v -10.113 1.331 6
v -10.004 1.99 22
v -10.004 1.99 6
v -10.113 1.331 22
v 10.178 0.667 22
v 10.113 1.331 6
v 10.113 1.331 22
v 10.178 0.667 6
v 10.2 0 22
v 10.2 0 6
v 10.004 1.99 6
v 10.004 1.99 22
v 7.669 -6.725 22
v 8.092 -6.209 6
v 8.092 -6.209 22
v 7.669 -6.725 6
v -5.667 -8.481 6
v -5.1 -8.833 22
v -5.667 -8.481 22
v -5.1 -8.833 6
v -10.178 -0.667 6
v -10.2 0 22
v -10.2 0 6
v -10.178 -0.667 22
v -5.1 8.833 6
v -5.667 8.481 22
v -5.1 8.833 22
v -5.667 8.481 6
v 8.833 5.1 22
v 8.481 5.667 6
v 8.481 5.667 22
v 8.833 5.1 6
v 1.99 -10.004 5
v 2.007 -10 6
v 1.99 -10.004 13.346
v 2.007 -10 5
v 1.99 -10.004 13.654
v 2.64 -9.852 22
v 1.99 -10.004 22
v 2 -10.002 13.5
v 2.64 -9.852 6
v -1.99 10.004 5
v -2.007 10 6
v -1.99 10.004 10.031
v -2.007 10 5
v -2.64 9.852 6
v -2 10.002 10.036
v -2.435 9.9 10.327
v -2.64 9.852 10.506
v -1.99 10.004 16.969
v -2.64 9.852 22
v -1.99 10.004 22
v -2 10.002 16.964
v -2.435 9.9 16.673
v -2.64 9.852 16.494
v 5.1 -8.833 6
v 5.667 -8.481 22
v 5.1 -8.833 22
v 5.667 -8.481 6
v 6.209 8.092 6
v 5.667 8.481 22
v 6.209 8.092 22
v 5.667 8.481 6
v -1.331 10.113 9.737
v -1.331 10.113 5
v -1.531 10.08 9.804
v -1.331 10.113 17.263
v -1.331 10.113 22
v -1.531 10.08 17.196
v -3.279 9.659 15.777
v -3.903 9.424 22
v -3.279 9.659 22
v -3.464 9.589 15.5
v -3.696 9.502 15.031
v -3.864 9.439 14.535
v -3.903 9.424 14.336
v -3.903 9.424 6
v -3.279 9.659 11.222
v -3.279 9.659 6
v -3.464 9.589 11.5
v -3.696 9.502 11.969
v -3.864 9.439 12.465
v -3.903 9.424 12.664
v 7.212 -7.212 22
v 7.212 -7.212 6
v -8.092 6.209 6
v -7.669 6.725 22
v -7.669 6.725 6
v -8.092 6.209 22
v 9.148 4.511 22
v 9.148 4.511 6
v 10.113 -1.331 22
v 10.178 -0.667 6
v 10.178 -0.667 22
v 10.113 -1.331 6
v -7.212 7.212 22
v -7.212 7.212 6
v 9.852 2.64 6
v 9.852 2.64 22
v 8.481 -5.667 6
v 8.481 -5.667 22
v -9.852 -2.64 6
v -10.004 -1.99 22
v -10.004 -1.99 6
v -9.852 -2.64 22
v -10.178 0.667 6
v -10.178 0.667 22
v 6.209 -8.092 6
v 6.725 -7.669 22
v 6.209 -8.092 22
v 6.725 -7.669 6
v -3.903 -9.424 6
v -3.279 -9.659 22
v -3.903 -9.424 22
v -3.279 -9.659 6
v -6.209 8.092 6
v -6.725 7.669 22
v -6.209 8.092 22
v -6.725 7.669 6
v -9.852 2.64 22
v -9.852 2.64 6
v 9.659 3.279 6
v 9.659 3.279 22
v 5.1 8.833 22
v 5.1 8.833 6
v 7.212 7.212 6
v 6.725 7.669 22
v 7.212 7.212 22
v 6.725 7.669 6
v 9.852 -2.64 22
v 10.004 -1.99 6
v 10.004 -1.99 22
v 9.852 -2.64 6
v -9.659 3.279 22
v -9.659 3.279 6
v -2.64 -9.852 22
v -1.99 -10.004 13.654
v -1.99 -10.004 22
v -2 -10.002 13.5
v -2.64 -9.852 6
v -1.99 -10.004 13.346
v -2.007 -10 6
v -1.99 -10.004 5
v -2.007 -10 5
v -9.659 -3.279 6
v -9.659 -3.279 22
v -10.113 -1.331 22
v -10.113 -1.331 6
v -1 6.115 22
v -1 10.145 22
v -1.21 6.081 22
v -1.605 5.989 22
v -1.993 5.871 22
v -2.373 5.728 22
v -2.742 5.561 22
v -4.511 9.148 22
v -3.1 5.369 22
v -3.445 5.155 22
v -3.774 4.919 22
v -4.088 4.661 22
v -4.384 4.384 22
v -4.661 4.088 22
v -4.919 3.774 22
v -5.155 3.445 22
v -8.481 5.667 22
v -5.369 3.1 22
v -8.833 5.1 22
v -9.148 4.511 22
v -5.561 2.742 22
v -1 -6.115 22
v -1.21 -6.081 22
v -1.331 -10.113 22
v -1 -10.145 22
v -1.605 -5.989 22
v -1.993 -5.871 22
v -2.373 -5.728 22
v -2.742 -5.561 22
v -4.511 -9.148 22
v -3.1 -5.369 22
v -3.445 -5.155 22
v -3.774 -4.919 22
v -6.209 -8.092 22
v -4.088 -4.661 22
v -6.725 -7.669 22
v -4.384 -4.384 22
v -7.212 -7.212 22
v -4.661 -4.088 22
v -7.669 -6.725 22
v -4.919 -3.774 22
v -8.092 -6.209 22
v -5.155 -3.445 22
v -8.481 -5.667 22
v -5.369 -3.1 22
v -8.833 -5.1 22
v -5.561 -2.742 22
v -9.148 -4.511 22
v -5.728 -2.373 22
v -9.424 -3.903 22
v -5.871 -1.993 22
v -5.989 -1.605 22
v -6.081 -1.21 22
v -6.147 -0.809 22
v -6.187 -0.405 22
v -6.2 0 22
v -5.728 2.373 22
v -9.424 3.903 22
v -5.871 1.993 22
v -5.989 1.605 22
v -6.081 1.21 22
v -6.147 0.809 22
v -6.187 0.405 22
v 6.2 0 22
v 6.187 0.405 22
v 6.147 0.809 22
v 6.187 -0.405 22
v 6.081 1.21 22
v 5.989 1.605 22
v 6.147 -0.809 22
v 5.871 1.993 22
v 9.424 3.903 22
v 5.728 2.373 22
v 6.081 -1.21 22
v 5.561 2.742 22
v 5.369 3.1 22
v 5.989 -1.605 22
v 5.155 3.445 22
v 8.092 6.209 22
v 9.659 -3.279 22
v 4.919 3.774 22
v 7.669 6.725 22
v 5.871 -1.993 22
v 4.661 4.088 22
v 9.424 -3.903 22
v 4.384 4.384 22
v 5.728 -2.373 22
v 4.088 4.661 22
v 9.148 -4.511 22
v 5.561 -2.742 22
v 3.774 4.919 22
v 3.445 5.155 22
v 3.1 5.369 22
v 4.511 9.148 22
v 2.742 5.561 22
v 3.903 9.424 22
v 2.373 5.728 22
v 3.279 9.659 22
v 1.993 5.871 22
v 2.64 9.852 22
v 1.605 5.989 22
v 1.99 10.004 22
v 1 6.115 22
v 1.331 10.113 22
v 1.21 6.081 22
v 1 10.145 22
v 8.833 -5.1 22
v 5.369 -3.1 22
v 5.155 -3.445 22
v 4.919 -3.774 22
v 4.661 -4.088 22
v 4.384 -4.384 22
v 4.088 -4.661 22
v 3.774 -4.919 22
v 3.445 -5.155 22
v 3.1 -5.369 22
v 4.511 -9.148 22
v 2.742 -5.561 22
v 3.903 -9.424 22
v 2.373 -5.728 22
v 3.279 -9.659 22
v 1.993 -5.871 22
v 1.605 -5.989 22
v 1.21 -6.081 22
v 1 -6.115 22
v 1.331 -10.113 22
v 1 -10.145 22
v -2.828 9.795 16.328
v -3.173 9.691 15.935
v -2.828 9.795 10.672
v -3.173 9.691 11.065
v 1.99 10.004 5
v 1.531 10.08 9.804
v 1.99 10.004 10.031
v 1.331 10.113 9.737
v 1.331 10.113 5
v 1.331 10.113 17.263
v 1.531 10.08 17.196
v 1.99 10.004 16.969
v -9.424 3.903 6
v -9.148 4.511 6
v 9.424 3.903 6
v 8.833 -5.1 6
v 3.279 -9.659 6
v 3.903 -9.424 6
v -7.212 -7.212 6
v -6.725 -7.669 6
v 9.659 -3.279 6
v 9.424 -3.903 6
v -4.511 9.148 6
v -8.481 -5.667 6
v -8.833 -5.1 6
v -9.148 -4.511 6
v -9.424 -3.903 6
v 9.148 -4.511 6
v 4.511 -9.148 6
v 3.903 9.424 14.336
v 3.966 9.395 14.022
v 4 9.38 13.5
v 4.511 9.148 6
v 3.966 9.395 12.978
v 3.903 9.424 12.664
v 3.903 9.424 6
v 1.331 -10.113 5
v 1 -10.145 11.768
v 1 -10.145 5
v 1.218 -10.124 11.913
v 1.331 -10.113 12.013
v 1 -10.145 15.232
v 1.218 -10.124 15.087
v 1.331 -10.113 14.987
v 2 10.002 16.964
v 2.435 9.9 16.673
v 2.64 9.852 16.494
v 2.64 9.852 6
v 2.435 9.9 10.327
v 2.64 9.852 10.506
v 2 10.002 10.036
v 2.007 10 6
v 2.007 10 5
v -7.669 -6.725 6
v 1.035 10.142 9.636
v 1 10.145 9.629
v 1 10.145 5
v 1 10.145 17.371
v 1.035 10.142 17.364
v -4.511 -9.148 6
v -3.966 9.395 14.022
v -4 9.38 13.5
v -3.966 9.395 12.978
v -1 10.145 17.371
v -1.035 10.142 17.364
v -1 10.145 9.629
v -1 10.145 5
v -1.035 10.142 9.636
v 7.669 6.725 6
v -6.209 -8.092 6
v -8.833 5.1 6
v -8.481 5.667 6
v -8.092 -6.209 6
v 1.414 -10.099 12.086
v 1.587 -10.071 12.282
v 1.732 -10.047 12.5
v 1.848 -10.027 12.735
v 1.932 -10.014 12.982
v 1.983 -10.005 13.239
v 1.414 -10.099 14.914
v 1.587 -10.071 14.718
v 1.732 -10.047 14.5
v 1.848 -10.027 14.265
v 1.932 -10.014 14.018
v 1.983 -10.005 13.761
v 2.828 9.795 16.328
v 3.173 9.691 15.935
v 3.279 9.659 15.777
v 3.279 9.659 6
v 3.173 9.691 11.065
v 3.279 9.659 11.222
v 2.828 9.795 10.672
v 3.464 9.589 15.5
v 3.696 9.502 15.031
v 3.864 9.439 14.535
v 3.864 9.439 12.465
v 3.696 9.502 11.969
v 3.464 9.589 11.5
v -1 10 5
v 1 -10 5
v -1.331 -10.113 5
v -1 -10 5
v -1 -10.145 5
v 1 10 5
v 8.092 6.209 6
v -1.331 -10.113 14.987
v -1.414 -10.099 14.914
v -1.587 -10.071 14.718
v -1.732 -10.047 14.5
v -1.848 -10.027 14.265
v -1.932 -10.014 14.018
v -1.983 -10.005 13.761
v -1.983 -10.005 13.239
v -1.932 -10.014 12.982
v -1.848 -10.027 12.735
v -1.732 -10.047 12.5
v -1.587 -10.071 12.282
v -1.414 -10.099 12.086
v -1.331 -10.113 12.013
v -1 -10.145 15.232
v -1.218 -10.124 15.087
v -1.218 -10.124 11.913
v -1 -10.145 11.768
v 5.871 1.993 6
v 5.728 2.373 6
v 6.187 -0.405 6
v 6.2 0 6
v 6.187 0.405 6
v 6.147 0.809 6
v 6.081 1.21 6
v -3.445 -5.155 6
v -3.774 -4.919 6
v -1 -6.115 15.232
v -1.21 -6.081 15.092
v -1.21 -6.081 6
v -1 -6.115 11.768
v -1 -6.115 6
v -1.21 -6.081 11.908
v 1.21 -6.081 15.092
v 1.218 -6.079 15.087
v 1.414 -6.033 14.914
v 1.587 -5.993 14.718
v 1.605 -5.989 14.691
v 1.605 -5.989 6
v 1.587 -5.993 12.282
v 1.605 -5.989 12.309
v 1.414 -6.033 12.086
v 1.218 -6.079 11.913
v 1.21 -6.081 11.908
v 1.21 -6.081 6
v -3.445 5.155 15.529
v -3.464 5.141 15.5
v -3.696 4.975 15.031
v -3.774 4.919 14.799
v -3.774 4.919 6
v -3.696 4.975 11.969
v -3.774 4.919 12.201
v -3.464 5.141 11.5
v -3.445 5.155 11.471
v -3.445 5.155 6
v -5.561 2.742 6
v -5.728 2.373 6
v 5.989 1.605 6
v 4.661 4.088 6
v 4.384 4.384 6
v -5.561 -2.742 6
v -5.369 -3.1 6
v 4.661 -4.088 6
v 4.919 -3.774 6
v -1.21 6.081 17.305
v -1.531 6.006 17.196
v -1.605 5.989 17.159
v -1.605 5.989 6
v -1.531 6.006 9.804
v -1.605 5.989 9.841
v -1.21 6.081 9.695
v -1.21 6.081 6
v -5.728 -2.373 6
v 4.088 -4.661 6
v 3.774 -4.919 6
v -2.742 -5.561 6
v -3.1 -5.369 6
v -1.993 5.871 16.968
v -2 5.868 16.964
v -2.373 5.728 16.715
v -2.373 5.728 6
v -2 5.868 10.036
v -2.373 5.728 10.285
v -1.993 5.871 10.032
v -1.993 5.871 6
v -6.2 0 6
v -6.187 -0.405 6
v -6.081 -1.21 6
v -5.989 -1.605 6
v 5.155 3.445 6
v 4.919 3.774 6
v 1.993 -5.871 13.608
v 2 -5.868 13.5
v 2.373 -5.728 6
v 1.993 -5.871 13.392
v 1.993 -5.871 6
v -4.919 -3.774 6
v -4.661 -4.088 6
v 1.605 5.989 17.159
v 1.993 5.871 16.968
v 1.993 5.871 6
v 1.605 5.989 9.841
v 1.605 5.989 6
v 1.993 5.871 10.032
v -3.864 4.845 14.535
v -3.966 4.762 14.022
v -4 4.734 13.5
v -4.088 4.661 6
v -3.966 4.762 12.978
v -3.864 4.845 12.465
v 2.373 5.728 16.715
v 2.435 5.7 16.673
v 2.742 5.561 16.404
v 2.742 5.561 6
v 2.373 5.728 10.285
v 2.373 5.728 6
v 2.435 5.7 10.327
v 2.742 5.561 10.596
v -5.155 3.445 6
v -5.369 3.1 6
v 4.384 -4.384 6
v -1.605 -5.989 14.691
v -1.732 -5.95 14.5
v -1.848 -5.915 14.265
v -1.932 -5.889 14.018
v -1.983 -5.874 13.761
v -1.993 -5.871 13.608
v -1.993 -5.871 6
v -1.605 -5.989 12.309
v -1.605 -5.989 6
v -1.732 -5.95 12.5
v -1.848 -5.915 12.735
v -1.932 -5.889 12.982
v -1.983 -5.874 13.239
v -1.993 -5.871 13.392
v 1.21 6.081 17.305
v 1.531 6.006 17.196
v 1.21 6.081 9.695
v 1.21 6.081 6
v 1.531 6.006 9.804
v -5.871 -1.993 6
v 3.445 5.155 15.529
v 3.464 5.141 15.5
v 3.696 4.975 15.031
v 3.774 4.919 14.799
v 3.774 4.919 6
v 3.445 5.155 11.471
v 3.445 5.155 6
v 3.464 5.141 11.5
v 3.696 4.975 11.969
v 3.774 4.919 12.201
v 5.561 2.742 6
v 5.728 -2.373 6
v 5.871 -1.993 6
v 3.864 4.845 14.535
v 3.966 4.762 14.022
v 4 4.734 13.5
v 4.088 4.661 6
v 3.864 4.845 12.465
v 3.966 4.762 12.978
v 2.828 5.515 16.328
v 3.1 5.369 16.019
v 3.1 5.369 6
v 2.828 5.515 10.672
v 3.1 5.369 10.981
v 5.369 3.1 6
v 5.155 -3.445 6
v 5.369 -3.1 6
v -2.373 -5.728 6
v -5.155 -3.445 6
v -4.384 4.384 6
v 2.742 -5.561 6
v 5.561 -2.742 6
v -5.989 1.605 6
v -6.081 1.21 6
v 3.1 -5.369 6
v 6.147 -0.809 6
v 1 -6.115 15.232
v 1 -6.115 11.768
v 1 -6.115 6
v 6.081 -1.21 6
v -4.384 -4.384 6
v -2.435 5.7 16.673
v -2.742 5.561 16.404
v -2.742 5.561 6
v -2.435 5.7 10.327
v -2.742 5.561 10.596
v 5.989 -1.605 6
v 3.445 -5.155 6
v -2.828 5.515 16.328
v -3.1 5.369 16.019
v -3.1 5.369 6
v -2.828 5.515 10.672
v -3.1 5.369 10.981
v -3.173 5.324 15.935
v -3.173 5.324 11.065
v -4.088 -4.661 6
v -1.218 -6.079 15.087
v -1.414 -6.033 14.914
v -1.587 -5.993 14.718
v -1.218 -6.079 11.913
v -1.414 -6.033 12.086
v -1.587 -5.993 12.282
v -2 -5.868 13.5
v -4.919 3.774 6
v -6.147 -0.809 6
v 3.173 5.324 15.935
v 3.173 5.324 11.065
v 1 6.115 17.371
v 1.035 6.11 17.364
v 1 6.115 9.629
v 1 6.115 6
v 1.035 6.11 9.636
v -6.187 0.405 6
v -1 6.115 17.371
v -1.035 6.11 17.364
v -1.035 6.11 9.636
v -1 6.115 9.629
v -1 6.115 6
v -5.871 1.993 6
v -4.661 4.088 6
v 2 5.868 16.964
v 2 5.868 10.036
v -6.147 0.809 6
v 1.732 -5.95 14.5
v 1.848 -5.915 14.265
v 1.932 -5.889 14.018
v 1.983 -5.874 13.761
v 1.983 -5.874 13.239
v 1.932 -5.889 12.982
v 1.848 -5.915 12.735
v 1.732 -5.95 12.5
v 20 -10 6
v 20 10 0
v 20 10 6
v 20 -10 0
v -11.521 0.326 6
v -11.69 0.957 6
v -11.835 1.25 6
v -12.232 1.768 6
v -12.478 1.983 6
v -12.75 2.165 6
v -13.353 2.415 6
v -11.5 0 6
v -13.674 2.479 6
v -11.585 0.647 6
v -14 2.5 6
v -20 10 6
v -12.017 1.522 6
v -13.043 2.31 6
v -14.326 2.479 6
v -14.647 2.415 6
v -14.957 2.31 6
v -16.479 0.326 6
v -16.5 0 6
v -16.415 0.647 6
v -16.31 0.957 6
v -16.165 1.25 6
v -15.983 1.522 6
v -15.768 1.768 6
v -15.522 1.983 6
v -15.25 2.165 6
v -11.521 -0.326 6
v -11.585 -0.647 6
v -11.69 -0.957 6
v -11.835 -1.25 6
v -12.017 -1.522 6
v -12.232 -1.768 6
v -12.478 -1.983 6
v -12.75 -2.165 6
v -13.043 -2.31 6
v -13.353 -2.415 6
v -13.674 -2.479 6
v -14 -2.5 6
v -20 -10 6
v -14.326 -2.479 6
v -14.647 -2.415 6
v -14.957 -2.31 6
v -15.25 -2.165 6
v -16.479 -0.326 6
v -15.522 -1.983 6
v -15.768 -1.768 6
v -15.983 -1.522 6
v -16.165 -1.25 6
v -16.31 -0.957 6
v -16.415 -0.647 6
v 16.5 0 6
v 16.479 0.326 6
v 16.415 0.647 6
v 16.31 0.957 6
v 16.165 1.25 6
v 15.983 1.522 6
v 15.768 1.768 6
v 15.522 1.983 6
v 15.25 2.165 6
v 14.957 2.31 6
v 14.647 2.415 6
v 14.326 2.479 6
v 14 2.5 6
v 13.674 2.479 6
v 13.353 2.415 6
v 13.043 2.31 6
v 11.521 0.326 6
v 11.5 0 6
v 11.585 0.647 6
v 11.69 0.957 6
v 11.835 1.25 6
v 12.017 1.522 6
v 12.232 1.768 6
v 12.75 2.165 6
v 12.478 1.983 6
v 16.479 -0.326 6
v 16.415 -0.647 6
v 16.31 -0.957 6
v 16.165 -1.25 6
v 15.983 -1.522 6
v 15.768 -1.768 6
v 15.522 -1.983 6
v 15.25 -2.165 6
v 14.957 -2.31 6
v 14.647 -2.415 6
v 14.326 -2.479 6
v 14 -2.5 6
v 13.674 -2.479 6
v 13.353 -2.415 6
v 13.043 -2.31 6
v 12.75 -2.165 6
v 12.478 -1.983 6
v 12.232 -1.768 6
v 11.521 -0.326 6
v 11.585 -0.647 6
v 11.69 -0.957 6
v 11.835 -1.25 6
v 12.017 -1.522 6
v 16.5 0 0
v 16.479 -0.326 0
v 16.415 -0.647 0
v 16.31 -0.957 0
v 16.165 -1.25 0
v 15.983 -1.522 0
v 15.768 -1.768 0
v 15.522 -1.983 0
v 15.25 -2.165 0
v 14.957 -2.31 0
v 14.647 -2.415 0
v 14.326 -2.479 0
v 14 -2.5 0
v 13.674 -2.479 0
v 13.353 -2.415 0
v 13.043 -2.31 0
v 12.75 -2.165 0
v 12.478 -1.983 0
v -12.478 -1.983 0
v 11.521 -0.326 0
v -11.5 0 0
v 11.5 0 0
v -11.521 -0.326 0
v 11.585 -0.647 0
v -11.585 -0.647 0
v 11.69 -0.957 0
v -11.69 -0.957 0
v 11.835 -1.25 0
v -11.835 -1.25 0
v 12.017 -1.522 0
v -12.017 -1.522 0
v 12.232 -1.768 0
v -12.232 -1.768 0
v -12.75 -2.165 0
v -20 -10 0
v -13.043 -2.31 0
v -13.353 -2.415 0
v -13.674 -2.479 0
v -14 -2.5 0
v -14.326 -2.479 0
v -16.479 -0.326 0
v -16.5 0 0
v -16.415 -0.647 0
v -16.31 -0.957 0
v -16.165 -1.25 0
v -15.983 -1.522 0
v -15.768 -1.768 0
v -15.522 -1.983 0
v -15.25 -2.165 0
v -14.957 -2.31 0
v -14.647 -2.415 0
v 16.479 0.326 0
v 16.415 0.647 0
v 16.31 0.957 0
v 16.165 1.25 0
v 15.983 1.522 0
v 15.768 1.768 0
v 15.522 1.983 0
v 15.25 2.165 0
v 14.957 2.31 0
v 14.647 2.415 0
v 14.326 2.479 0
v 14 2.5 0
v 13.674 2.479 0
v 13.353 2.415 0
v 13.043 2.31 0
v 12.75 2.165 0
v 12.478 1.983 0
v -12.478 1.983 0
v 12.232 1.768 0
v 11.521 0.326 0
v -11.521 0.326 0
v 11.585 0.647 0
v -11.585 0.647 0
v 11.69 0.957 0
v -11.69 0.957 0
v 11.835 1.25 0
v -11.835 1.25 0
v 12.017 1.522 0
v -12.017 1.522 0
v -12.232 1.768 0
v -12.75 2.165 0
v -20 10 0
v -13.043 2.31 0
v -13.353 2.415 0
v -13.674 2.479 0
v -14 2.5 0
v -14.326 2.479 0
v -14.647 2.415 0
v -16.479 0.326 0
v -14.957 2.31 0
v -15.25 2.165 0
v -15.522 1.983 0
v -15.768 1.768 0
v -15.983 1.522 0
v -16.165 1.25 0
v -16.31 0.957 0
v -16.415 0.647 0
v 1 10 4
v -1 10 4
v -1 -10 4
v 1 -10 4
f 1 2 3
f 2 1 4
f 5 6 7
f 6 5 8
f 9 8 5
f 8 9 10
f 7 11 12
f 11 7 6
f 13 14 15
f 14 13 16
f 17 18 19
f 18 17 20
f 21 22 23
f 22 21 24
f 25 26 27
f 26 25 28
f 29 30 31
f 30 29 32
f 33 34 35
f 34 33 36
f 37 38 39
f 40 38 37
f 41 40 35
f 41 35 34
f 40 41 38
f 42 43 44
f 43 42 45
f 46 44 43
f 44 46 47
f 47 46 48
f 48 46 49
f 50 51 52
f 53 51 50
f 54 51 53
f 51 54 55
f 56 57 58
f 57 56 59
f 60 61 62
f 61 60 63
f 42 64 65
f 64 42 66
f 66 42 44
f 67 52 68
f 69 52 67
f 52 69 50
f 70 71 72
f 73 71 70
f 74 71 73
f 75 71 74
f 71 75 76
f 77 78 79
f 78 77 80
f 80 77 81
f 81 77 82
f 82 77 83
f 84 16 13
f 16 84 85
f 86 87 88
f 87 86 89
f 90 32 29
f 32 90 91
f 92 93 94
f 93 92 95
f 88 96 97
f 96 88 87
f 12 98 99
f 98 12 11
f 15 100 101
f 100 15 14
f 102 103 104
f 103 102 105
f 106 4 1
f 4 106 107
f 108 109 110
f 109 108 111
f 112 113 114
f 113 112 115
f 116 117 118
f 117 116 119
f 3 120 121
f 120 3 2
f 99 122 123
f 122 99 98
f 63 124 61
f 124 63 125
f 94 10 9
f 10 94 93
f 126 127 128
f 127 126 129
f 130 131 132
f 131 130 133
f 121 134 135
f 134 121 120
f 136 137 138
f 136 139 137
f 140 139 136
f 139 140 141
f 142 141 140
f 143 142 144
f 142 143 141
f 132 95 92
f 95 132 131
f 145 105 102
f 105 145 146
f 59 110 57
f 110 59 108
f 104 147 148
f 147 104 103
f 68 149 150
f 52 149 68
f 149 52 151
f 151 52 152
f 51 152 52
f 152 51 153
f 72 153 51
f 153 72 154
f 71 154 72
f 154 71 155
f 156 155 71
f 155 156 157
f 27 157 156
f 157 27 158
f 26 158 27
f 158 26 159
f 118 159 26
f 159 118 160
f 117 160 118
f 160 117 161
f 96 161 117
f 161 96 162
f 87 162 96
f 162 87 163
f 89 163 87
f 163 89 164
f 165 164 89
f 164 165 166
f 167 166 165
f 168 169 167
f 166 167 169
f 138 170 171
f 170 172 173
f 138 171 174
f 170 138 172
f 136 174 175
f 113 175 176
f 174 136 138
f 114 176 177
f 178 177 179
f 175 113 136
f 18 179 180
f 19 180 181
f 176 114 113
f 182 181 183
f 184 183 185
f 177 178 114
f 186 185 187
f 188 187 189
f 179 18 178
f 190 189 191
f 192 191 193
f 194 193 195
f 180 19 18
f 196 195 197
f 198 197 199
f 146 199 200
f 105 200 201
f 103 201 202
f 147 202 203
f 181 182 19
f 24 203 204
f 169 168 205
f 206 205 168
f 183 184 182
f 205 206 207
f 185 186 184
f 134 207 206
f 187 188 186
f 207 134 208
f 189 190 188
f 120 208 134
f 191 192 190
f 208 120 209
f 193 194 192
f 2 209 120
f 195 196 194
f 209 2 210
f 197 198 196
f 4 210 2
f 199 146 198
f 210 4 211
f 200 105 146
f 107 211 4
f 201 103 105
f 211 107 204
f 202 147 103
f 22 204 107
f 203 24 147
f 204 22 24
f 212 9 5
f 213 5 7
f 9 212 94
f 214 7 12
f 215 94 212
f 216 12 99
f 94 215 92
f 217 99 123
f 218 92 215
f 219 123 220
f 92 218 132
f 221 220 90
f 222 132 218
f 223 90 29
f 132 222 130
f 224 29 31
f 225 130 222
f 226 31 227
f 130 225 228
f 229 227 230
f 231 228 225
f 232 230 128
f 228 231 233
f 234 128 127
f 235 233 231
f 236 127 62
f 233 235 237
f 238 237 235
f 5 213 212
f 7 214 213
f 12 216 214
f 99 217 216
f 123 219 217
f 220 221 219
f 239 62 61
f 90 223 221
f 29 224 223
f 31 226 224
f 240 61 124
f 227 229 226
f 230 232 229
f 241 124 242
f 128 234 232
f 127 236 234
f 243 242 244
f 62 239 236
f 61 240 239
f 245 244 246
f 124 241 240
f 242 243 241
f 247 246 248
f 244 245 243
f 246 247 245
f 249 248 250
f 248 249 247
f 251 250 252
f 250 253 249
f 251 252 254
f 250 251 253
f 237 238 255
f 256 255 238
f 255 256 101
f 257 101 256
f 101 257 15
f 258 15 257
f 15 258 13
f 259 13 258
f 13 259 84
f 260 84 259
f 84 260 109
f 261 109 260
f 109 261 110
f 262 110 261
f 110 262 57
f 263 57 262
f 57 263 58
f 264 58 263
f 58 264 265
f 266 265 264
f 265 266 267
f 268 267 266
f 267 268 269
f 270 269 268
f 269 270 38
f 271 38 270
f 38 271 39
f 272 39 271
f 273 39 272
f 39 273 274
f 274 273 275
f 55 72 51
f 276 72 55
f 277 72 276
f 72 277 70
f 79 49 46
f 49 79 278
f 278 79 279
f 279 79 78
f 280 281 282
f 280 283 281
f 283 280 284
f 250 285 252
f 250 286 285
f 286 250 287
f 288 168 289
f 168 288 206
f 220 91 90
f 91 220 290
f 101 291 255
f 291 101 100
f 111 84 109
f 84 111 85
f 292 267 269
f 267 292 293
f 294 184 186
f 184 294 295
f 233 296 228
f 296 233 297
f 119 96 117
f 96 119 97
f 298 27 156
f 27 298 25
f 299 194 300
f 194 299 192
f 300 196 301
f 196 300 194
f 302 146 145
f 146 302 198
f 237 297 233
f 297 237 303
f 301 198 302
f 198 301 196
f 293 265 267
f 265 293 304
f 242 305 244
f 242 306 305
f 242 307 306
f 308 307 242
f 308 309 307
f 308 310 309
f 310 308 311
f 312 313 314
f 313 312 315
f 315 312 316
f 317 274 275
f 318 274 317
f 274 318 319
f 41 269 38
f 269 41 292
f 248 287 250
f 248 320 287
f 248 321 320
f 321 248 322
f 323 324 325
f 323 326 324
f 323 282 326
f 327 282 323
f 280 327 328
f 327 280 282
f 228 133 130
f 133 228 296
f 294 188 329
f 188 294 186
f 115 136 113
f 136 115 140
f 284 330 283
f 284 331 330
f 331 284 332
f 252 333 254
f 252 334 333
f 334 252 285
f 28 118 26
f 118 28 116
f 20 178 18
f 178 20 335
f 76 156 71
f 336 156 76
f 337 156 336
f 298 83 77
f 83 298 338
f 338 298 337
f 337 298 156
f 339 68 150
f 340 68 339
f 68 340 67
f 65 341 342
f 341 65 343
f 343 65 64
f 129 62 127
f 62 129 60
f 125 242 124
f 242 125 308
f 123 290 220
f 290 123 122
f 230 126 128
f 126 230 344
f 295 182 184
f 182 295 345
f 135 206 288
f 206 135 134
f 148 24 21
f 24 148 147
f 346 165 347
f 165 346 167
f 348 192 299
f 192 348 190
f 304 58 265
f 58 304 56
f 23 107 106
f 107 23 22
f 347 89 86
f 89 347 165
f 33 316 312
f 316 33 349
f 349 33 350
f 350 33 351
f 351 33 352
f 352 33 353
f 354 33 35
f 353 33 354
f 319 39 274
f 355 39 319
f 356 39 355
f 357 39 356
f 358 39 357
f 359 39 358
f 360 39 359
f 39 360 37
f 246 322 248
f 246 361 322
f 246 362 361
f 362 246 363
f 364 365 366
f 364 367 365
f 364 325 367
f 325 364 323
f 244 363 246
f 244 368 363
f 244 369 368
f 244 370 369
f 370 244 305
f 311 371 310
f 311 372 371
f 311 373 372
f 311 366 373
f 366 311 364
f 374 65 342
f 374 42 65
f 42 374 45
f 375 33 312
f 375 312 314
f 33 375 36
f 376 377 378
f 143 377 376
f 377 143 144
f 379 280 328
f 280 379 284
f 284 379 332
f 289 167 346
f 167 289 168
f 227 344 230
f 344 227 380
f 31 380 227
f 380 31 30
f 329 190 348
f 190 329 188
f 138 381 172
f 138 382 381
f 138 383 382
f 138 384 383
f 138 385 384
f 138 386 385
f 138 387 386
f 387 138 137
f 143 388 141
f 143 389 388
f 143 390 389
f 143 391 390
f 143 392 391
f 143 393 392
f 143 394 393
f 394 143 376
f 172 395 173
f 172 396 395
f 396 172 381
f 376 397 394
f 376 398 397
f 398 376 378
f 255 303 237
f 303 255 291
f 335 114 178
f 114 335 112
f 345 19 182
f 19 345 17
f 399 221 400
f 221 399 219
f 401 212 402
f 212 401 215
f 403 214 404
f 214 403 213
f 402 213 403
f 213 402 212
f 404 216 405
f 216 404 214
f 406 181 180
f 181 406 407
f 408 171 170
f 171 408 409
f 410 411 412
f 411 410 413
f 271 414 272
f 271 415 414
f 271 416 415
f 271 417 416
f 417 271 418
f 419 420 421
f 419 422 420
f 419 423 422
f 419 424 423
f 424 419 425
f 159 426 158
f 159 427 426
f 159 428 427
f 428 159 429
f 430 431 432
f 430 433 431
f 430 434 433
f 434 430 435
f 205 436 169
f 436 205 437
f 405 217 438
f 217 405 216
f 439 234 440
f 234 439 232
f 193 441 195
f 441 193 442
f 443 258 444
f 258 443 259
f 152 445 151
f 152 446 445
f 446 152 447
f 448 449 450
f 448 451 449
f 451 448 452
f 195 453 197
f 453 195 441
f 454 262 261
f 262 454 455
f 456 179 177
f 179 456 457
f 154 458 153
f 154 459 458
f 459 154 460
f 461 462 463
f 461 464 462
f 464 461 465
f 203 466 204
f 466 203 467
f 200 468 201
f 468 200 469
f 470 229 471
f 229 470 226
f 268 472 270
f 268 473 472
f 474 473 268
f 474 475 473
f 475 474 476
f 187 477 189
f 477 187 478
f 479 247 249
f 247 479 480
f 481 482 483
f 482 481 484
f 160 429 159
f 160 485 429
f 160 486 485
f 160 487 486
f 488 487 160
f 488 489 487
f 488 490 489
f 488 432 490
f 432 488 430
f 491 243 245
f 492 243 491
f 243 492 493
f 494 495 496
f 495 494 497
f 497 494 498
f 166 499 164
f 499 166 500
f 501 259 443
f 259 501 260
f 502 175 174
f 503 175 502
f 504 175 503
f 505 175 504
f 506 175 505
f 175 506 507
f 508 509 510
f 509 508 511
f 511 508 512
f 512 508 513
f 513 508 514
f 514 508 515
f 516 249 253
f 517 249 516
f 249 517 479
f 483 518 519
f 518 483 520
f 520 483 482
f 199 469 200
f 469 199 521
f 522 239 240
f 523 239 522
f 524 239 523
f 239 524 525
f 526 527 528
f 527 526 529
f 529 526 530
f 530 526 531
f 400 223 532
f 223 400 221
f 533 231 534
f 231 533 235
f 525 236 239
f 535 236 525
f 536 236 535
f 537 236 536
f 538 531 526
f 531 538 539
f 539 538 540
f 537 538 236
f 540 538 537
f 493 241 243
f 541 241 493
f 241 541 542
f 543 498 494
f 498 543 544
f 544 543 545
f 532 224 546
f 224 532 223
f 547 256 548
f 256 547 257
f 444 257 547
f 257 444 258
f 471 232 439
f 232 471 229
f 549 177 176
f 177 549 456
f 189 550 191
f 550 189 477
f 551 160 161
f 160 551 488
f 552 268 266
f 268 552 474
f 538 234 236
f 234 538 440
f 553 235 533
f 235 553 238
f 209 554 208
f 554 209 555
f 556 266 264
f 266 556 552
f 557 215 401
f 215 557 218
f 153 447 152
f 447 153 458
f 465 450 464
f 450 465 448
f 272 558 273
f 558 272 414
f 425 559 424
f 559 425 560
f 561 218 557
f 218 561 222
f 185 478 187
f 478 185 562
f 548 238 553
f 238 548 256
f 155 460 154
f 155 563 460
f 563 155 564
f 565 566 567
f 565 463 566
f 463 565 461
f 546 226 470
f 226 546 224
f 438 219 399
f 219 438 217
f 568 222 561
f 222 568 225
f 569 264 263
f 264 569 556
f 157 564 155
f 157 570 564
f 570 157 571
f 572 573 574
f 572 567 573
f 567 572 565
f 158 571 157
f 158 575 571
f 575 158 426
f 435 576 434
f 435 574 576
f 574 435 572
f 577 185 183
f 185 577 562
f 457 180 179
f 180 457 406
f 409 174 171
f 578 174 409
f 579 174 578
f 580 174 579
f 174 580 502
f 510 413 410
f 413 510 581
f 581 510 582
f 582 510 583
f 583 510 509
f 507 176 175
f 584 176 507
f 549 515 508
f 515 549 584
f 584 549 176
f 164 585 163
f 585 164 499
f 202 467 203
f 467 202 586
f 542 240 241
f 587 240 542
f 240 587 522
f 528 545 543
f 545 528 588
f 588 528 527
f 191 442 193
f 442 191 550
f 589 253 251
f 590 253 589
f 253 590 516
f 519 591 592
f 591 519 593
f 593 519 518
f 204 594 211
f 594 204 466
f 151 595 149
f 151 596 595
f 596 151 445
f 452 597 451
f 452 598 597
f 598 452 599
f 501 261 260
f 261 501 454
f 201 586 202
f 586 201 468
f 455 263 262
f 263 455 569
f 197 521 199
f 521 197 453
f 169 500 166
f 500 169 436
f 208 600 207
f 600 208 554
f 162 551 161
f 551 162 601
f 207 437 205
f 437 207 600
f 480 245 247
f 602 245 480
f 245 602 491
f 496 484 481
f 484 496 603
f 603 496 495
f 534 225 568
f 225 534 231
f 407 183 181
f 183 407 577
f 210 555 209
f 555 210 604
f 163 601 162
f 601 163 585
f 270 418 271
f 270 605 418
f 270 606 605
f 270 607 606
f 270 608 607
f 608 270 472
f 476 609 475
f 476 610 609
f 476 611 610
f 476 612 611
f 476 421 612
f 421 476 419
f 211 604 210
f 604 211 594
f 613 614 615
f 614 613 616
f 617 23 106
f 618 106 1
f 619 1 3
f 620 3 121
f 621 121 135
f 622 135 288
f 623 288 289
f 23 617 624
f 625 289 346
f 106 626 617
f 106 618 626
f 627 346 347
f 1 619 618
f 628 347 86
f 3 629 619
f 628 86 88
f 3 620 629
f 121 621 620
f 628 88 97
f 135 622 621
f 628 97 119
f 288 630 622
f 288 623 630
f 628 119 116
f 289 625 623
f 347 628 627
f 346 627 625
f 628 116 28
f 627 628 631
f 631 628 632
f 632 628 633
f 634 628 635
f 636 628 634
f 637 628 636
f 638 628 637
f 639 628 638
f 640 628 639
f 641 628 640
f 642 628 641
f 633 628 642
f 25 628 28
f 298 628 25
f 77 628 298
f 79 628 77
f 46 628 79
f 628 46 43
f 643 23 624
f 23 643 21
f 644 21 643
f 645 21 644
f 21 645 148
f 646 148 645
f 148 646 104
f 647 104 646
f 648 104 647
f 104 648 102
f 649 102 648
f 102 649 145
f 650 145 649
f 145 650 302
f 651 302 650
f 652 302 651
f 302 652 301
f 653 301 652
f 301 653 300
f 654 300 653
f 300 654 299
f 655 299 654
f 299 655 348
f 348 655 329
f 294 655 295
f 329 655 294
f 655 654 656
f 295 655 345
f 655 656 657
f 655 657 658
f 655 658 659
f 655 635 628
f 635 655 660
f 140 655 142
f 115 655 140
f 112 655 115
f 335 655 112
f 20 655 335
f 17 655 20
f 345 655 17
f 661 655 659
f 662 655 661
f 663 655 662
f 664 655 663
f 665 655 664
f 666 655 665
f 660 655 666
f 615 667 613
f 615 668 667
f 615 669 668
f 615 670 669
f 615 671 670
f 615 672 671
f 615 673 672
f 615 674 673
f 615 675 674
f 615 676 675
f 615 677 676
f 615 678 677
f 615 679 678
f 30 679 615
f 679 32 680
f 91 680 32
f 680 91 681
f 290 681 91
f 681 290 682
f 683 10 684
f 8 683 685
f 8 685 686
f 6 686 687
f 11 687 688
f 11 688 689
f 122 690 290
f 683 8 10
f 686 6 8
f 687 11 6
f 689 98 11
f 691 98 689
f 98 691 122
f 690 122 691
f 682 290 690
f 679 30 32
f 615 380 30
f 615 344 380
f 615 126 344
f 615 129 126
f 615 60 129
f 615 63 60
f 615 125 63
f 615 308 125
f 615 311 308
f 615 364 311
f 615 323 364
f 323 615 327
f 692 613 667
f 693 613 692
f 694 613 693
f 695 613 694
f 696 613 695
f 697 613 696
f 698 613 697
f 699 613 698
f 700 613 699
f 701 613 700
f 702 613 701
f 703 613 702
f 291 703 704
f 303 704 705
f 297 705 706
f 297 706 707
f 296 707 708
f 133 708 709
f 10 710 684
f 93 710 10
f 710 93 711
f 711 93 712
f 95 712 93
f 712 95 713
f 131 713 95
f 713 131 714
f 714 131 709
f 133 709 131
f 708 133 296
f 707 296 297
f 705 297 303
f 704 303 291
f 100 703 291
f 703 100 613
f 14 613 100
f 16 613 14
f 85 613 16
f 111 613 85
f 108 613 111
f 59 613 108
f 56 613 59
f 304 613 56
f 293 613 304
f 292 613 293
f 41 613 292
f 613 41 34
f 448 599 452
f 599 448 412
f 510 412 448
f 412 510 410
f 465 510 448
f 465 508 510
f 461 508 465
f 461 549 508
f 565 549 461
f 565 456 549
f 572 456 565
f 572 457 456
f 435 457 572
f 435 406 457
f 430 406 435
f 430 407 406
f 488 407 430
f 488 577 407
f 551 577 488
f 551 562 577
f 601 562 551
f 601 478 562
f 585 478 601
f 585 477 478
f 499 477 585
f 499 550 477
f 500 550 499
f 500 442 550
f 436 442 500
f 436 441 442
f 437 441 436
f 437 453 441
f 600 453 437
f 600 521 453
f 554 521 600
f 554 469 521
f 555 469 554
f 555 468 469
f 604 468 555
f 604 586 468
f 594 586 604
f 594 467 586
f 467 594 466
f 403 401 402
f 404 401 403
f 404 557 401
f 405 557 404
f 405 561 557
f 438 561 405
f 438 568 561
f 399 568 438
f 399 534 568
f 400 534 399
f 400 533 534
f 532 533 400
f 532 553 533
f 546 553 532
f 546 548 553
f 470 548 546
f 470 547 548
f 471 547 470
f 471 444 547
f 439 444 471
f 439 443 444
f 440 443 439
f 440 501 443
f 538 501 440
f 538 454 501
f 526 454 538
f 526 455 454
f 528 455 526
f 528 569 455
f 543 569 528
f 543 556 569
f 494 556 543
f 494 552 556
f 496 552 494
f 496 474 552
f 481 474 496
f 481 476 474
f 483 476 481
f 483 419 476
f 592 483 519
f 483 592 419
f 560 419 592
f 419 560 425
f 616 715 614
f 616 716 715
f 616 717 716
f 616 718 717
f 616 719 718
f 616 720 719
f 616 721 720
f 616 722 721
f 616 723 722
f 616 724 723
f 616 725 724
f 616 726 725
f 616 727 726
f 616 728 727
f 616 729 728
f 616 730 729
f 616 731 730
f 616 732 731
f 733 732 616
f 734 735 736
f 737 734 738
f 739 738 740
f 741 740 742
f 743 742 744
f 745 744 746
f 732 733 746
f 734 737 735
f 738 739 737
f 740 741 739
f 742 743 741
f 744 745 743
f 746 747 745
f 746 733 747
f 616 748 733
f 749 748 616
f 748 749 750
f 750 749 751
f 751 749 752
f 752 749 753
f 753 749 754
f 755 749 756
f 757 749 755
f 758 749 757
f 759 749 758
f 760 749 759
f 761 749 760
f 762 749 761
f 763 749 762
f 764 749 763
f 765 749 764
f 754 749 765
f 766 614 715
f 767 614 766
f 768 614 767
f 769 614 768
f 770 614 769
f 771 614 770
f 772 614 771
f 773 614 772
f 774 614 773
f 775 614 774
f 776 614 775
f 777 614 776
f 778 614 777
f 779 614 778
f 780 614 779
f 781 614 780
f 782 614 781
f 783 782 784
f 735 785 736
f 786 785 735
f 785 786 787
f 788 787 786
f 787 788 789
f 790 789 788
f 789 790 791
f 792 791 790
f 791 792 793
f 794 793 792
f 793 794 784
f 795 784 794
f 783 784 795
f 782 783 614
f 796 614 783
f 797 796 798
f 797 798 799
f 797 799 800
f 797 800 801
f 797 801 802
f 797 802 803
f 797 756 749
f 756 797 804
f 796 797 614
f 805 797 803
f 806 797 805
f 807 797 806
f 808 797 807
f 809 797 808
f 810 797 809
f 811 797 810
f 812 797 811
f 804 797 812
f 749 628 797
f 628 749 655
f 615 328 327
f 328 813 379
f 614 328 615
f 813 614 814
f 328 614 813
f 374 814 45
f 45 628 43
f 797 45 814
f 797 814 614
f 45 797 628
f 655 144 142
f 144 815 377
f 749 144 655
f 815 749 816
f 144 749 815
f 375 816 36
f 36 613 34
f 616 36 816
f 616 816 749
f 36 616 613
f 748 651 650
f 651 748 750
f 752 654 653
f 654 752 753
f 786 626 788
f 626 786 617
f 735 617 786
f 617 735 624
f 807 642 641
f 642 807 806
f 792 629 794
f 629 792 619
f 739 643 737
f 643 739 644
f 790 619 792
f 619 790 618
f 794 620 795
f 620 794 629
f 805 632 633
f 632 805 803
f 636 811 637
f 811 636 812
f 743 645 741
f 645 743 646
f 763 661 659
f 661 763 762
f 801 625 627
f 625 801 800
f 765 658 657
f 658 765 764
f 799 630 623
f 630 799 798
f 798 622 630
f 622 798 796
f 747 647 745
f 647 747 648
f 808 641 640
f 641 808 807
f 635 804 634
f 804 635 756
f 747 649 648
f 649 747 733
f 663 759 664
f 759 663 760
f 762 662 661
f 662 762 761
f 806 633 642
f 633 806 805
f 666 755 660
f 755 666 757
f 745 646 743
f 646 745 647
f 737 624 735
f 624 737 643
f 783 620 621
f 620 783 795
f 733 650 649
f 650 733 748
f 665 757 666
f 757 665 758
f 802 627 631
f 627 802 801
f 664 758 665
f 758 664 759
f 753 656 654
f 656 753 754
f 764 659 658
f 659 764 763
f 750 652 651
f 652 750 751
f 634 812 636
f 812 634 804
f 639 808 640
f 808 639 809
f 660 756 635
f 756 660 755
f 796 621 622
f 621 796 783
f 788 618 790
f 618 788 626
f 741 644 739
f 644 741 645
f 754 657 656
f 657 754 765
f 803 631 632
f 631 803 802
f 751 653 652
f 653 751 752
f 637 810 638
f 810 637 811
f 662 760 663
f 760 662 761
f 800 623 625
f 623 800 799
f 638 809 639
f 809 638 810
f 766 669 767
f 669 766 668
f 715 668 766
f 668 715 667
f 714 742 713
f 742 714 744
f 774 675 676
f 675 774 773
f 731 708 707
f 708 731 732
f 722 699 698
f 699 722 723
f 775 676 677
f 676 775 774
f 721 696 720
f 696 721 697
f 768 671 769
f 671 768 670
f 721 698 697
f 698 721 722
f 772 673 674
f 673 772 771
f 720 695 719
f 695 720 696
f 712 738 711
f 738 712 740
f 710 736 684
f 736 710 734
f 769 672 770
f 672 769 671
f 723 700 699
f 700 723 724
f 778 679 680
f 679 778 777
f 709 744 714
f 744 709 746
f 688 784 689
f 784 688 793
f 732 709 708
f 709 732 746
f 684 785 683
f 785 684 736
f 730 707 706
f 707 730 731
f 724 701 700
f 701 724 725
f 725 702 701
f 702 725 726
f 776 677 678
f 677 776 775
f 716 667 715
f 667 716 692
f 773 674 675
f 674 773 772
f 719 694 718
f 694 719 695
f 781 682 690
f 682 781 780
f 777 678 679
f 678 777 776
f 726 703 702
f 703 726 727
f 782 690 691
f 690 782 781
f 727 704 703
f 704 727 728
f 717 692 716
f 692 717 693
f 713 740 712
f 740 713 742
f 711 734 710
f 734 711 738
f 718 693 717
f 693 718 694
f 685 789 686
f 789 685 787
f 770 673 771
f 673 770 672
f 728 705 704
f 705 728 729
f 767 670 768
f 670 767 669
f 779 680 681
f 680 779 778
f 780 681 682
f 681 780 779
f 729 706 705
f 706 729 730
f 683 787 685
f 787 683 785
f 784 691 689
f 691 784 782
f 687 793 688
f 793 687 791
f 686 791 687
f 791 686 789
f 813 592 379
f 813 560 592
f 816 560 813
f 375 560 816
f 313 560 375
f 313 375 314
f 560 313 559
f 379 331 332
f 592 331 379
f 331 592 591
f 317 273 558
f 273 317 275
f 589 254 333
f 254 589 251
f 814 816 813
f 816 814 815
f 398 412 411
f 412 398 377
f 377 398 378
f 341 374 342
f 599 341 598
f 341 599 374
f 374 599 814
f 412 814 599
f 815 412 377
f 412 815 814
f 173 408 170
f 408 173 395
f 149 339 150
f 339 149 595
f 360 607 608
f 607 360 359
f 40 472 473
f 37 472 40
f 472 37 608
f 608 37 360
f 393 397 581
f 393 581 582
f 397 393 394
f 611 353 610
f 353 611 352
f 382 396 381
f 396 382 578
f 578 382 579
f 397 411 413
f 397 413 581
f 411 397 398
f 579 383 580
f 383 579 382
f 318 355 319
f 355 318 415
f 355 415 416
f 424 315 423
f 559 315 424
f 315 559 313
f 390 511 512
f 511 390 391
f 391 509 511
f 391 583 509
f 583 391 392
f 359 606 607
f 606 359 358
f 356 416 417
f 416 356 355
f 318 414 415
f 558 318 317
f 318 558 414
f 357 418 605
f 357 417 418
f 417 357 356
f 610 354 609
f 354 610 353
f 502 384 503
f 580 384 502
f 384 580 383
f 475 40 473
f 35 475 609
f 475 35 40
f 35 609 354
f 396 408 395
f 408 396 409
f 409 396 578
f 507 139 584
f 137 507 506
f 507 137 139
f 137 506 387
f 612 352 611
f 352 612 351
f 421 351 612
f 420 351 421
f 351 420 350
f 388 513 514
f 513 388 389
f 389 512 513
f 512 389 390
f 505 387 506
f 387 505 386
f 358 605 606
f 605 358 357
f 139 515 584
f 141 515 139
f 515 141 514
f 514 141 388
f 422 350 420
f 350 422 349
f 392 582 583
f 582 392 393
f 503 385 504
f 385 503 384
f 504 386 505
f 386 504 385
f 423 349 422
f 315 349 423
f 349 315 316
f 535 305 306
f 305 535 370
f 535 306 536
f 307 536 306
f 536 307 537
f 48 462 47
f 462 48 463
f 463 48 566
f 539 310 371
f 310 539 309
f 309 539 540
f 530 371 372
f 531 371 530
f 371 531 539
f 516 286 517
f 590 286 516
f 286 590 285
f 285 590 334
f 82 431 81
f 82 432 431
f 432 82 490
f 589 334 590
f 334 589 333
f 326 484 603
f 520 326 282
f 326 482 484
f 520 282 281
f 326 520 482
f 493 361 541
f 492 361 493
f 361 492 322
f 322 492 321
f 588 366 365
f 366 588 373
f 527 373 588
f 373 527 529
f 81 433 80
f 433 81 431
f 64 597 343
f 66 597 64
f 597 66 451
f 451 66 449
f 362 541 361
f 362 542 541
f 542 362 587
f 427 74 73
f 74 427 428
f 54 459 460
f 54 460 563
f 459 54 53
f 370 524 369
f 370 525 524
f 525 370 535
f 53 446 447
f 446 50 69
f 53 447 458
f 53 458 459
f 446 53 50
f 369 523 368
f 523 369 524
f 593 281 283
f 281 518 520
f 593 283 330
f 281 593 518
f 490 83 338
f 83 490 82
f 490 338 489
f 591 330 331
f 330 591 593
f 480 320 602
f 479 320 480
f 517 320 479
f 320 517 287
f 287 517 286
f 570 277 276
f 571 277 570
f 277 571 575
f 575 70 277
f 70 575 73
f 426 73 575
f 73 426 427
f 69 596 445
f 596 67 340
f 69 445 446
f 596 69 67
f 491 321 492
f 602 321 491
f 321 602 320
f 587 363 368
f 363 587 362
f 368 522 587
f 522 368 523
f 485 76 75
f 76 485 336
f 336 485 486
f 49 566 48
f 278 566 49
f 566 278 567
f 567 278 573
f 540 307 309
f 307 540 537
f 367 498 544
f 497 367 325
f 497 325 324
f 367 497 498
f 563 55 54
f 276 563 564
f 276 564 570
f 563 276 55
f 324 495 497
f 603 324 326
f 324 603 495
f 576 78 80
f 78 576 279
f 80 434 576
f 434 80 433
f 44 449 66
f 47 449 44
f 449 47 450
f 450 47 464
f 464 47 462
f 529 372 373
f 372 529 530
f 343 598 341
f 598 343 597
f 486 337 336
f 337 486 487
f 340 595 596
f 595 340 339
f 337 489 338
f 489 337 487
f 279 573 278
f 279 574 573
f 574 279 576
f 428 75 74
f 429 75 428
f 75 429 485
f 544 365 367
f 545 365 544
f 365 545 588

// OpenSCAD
// Shaft support bracket for 12.0mm rod, 23.0mm tall
// One connected solid (bracket only). No separate rod preview.

// Parameters
rod_diameter = 12; //[6:24:0.1]
overall_height = 23; //[12:46:0.1]
base_length = 40; //[20:80:0.1]
base_width = 20; //[10:40:0.1]
base_thickness = 6; //[3:12:0.1]
cradle_wall_thickness = 4; //[2:8:0.1]
mount_hole_count = 2; //[1:4:1]
mount_hole_diameter = 5; //[3:10:0.1]
mount_hole_spacing = 28; //[14:56:0.1]
mount_hole_edge_margin = 6; //[3:12:0.1]
clamp_enabled = 1; //[0:1:1]
clamp_screw_diameter = 4; //[2:8:0.1]
clamp_screw_head_clearance_diameter = 8; //[4:16:0.1]
clamp_slot_width = 2; //[1:5:0.1]
tolerance_clearance = 0.2; //[0:0.6:0.05]
overlap = 1; //[0.5:2:0.1]

$fn = 96;

// Derived
rod_r   = rod_diameter/2;
inner_r = rod_r + tolerance_clearance;
outer_r = inner_r + cradle_wall_thickness;

cradle_h = max(0.1, overall_height - base_thickness); // height of cradle above base

// Z placement (base sits on Z=0)
base_z0   = 0;
base_zc   = base_z0 + base_thickness/2;
cradle_z0 = base_z0 + base_thickness - overlap;       // overlap into base for connectivity
cradle_zc = cradle_z0 + cradle_h/2;

module bracket() {
  difference() {
    union() {
      // Base plate (bottom at Z=0)
      translate([0, 0, base_zc])
        cube([base_length, base_width, base_thickness], center=true);

      // Ring cradle (connected to base via overlap)
      translate([0, 0, cradle_zc])
        difference() {
          cylinder(r=outer_r, h=cradle_h, center=true);
          cylinder(r=inner_r, h=cradle_h + 2*overlap, center=true);
        }
    }

    // Mounting holes through base (Z axis)
    if (mount_hole_count <= 1) {
      translate([0, 0, base_zc])
        cylinder(r=mount_hole_diameter/2, h=base_thickness + 2*overlap, center=true, $fn=48);
    } else {
      for (i = [0:mount_hole_count-1]) {
        x = (mount_hole_count==2)
            ? (i==0 ? -mount_hole_spacing/2 : mount_hole_spacing/2)
            : (-mount_hole_spacing/2 + i*(mount_hole_spacing/(mount_hole_count-1)));
        translate([x, 0, base_zc])
          cylinder(r=mount_hole_diameter/2, h=base_thickness + 2*overlap, center=true, $fn=48);
      }
    }

    // Clamp split + screw features (cut through cradle)
    if (clamp_enabled) {
      // Split slot (cuts ring to make clamp)
      translate([0, 0, cradle_zc])
        cube([clamp_slot_width, 2*outer_r + 2*overlap, cradle_h + 2*overlap], center=true);

      // Screw through-hole across Y (perpendicular to rod axis)
      translate([0, 0, cradle_zc])
        rotate([90, 0, 0])
          cylinder(r=clamp_screw_diameter/2, h=2*outer_r + 2*overlap, center=true, $fn=48);

      // Screw head clearance pocket from +Y side (ensure it reaches the outside face)
      translate([0, outer_r/2, cradle_zc])
        rotate([90, 0, 0])
          cylinder(r=clamp_screw_head_clearance_diameter/2,
                   h=outer_r + 2*overlap, center=true, $fn=48);
    }
  }
}

bracket();
